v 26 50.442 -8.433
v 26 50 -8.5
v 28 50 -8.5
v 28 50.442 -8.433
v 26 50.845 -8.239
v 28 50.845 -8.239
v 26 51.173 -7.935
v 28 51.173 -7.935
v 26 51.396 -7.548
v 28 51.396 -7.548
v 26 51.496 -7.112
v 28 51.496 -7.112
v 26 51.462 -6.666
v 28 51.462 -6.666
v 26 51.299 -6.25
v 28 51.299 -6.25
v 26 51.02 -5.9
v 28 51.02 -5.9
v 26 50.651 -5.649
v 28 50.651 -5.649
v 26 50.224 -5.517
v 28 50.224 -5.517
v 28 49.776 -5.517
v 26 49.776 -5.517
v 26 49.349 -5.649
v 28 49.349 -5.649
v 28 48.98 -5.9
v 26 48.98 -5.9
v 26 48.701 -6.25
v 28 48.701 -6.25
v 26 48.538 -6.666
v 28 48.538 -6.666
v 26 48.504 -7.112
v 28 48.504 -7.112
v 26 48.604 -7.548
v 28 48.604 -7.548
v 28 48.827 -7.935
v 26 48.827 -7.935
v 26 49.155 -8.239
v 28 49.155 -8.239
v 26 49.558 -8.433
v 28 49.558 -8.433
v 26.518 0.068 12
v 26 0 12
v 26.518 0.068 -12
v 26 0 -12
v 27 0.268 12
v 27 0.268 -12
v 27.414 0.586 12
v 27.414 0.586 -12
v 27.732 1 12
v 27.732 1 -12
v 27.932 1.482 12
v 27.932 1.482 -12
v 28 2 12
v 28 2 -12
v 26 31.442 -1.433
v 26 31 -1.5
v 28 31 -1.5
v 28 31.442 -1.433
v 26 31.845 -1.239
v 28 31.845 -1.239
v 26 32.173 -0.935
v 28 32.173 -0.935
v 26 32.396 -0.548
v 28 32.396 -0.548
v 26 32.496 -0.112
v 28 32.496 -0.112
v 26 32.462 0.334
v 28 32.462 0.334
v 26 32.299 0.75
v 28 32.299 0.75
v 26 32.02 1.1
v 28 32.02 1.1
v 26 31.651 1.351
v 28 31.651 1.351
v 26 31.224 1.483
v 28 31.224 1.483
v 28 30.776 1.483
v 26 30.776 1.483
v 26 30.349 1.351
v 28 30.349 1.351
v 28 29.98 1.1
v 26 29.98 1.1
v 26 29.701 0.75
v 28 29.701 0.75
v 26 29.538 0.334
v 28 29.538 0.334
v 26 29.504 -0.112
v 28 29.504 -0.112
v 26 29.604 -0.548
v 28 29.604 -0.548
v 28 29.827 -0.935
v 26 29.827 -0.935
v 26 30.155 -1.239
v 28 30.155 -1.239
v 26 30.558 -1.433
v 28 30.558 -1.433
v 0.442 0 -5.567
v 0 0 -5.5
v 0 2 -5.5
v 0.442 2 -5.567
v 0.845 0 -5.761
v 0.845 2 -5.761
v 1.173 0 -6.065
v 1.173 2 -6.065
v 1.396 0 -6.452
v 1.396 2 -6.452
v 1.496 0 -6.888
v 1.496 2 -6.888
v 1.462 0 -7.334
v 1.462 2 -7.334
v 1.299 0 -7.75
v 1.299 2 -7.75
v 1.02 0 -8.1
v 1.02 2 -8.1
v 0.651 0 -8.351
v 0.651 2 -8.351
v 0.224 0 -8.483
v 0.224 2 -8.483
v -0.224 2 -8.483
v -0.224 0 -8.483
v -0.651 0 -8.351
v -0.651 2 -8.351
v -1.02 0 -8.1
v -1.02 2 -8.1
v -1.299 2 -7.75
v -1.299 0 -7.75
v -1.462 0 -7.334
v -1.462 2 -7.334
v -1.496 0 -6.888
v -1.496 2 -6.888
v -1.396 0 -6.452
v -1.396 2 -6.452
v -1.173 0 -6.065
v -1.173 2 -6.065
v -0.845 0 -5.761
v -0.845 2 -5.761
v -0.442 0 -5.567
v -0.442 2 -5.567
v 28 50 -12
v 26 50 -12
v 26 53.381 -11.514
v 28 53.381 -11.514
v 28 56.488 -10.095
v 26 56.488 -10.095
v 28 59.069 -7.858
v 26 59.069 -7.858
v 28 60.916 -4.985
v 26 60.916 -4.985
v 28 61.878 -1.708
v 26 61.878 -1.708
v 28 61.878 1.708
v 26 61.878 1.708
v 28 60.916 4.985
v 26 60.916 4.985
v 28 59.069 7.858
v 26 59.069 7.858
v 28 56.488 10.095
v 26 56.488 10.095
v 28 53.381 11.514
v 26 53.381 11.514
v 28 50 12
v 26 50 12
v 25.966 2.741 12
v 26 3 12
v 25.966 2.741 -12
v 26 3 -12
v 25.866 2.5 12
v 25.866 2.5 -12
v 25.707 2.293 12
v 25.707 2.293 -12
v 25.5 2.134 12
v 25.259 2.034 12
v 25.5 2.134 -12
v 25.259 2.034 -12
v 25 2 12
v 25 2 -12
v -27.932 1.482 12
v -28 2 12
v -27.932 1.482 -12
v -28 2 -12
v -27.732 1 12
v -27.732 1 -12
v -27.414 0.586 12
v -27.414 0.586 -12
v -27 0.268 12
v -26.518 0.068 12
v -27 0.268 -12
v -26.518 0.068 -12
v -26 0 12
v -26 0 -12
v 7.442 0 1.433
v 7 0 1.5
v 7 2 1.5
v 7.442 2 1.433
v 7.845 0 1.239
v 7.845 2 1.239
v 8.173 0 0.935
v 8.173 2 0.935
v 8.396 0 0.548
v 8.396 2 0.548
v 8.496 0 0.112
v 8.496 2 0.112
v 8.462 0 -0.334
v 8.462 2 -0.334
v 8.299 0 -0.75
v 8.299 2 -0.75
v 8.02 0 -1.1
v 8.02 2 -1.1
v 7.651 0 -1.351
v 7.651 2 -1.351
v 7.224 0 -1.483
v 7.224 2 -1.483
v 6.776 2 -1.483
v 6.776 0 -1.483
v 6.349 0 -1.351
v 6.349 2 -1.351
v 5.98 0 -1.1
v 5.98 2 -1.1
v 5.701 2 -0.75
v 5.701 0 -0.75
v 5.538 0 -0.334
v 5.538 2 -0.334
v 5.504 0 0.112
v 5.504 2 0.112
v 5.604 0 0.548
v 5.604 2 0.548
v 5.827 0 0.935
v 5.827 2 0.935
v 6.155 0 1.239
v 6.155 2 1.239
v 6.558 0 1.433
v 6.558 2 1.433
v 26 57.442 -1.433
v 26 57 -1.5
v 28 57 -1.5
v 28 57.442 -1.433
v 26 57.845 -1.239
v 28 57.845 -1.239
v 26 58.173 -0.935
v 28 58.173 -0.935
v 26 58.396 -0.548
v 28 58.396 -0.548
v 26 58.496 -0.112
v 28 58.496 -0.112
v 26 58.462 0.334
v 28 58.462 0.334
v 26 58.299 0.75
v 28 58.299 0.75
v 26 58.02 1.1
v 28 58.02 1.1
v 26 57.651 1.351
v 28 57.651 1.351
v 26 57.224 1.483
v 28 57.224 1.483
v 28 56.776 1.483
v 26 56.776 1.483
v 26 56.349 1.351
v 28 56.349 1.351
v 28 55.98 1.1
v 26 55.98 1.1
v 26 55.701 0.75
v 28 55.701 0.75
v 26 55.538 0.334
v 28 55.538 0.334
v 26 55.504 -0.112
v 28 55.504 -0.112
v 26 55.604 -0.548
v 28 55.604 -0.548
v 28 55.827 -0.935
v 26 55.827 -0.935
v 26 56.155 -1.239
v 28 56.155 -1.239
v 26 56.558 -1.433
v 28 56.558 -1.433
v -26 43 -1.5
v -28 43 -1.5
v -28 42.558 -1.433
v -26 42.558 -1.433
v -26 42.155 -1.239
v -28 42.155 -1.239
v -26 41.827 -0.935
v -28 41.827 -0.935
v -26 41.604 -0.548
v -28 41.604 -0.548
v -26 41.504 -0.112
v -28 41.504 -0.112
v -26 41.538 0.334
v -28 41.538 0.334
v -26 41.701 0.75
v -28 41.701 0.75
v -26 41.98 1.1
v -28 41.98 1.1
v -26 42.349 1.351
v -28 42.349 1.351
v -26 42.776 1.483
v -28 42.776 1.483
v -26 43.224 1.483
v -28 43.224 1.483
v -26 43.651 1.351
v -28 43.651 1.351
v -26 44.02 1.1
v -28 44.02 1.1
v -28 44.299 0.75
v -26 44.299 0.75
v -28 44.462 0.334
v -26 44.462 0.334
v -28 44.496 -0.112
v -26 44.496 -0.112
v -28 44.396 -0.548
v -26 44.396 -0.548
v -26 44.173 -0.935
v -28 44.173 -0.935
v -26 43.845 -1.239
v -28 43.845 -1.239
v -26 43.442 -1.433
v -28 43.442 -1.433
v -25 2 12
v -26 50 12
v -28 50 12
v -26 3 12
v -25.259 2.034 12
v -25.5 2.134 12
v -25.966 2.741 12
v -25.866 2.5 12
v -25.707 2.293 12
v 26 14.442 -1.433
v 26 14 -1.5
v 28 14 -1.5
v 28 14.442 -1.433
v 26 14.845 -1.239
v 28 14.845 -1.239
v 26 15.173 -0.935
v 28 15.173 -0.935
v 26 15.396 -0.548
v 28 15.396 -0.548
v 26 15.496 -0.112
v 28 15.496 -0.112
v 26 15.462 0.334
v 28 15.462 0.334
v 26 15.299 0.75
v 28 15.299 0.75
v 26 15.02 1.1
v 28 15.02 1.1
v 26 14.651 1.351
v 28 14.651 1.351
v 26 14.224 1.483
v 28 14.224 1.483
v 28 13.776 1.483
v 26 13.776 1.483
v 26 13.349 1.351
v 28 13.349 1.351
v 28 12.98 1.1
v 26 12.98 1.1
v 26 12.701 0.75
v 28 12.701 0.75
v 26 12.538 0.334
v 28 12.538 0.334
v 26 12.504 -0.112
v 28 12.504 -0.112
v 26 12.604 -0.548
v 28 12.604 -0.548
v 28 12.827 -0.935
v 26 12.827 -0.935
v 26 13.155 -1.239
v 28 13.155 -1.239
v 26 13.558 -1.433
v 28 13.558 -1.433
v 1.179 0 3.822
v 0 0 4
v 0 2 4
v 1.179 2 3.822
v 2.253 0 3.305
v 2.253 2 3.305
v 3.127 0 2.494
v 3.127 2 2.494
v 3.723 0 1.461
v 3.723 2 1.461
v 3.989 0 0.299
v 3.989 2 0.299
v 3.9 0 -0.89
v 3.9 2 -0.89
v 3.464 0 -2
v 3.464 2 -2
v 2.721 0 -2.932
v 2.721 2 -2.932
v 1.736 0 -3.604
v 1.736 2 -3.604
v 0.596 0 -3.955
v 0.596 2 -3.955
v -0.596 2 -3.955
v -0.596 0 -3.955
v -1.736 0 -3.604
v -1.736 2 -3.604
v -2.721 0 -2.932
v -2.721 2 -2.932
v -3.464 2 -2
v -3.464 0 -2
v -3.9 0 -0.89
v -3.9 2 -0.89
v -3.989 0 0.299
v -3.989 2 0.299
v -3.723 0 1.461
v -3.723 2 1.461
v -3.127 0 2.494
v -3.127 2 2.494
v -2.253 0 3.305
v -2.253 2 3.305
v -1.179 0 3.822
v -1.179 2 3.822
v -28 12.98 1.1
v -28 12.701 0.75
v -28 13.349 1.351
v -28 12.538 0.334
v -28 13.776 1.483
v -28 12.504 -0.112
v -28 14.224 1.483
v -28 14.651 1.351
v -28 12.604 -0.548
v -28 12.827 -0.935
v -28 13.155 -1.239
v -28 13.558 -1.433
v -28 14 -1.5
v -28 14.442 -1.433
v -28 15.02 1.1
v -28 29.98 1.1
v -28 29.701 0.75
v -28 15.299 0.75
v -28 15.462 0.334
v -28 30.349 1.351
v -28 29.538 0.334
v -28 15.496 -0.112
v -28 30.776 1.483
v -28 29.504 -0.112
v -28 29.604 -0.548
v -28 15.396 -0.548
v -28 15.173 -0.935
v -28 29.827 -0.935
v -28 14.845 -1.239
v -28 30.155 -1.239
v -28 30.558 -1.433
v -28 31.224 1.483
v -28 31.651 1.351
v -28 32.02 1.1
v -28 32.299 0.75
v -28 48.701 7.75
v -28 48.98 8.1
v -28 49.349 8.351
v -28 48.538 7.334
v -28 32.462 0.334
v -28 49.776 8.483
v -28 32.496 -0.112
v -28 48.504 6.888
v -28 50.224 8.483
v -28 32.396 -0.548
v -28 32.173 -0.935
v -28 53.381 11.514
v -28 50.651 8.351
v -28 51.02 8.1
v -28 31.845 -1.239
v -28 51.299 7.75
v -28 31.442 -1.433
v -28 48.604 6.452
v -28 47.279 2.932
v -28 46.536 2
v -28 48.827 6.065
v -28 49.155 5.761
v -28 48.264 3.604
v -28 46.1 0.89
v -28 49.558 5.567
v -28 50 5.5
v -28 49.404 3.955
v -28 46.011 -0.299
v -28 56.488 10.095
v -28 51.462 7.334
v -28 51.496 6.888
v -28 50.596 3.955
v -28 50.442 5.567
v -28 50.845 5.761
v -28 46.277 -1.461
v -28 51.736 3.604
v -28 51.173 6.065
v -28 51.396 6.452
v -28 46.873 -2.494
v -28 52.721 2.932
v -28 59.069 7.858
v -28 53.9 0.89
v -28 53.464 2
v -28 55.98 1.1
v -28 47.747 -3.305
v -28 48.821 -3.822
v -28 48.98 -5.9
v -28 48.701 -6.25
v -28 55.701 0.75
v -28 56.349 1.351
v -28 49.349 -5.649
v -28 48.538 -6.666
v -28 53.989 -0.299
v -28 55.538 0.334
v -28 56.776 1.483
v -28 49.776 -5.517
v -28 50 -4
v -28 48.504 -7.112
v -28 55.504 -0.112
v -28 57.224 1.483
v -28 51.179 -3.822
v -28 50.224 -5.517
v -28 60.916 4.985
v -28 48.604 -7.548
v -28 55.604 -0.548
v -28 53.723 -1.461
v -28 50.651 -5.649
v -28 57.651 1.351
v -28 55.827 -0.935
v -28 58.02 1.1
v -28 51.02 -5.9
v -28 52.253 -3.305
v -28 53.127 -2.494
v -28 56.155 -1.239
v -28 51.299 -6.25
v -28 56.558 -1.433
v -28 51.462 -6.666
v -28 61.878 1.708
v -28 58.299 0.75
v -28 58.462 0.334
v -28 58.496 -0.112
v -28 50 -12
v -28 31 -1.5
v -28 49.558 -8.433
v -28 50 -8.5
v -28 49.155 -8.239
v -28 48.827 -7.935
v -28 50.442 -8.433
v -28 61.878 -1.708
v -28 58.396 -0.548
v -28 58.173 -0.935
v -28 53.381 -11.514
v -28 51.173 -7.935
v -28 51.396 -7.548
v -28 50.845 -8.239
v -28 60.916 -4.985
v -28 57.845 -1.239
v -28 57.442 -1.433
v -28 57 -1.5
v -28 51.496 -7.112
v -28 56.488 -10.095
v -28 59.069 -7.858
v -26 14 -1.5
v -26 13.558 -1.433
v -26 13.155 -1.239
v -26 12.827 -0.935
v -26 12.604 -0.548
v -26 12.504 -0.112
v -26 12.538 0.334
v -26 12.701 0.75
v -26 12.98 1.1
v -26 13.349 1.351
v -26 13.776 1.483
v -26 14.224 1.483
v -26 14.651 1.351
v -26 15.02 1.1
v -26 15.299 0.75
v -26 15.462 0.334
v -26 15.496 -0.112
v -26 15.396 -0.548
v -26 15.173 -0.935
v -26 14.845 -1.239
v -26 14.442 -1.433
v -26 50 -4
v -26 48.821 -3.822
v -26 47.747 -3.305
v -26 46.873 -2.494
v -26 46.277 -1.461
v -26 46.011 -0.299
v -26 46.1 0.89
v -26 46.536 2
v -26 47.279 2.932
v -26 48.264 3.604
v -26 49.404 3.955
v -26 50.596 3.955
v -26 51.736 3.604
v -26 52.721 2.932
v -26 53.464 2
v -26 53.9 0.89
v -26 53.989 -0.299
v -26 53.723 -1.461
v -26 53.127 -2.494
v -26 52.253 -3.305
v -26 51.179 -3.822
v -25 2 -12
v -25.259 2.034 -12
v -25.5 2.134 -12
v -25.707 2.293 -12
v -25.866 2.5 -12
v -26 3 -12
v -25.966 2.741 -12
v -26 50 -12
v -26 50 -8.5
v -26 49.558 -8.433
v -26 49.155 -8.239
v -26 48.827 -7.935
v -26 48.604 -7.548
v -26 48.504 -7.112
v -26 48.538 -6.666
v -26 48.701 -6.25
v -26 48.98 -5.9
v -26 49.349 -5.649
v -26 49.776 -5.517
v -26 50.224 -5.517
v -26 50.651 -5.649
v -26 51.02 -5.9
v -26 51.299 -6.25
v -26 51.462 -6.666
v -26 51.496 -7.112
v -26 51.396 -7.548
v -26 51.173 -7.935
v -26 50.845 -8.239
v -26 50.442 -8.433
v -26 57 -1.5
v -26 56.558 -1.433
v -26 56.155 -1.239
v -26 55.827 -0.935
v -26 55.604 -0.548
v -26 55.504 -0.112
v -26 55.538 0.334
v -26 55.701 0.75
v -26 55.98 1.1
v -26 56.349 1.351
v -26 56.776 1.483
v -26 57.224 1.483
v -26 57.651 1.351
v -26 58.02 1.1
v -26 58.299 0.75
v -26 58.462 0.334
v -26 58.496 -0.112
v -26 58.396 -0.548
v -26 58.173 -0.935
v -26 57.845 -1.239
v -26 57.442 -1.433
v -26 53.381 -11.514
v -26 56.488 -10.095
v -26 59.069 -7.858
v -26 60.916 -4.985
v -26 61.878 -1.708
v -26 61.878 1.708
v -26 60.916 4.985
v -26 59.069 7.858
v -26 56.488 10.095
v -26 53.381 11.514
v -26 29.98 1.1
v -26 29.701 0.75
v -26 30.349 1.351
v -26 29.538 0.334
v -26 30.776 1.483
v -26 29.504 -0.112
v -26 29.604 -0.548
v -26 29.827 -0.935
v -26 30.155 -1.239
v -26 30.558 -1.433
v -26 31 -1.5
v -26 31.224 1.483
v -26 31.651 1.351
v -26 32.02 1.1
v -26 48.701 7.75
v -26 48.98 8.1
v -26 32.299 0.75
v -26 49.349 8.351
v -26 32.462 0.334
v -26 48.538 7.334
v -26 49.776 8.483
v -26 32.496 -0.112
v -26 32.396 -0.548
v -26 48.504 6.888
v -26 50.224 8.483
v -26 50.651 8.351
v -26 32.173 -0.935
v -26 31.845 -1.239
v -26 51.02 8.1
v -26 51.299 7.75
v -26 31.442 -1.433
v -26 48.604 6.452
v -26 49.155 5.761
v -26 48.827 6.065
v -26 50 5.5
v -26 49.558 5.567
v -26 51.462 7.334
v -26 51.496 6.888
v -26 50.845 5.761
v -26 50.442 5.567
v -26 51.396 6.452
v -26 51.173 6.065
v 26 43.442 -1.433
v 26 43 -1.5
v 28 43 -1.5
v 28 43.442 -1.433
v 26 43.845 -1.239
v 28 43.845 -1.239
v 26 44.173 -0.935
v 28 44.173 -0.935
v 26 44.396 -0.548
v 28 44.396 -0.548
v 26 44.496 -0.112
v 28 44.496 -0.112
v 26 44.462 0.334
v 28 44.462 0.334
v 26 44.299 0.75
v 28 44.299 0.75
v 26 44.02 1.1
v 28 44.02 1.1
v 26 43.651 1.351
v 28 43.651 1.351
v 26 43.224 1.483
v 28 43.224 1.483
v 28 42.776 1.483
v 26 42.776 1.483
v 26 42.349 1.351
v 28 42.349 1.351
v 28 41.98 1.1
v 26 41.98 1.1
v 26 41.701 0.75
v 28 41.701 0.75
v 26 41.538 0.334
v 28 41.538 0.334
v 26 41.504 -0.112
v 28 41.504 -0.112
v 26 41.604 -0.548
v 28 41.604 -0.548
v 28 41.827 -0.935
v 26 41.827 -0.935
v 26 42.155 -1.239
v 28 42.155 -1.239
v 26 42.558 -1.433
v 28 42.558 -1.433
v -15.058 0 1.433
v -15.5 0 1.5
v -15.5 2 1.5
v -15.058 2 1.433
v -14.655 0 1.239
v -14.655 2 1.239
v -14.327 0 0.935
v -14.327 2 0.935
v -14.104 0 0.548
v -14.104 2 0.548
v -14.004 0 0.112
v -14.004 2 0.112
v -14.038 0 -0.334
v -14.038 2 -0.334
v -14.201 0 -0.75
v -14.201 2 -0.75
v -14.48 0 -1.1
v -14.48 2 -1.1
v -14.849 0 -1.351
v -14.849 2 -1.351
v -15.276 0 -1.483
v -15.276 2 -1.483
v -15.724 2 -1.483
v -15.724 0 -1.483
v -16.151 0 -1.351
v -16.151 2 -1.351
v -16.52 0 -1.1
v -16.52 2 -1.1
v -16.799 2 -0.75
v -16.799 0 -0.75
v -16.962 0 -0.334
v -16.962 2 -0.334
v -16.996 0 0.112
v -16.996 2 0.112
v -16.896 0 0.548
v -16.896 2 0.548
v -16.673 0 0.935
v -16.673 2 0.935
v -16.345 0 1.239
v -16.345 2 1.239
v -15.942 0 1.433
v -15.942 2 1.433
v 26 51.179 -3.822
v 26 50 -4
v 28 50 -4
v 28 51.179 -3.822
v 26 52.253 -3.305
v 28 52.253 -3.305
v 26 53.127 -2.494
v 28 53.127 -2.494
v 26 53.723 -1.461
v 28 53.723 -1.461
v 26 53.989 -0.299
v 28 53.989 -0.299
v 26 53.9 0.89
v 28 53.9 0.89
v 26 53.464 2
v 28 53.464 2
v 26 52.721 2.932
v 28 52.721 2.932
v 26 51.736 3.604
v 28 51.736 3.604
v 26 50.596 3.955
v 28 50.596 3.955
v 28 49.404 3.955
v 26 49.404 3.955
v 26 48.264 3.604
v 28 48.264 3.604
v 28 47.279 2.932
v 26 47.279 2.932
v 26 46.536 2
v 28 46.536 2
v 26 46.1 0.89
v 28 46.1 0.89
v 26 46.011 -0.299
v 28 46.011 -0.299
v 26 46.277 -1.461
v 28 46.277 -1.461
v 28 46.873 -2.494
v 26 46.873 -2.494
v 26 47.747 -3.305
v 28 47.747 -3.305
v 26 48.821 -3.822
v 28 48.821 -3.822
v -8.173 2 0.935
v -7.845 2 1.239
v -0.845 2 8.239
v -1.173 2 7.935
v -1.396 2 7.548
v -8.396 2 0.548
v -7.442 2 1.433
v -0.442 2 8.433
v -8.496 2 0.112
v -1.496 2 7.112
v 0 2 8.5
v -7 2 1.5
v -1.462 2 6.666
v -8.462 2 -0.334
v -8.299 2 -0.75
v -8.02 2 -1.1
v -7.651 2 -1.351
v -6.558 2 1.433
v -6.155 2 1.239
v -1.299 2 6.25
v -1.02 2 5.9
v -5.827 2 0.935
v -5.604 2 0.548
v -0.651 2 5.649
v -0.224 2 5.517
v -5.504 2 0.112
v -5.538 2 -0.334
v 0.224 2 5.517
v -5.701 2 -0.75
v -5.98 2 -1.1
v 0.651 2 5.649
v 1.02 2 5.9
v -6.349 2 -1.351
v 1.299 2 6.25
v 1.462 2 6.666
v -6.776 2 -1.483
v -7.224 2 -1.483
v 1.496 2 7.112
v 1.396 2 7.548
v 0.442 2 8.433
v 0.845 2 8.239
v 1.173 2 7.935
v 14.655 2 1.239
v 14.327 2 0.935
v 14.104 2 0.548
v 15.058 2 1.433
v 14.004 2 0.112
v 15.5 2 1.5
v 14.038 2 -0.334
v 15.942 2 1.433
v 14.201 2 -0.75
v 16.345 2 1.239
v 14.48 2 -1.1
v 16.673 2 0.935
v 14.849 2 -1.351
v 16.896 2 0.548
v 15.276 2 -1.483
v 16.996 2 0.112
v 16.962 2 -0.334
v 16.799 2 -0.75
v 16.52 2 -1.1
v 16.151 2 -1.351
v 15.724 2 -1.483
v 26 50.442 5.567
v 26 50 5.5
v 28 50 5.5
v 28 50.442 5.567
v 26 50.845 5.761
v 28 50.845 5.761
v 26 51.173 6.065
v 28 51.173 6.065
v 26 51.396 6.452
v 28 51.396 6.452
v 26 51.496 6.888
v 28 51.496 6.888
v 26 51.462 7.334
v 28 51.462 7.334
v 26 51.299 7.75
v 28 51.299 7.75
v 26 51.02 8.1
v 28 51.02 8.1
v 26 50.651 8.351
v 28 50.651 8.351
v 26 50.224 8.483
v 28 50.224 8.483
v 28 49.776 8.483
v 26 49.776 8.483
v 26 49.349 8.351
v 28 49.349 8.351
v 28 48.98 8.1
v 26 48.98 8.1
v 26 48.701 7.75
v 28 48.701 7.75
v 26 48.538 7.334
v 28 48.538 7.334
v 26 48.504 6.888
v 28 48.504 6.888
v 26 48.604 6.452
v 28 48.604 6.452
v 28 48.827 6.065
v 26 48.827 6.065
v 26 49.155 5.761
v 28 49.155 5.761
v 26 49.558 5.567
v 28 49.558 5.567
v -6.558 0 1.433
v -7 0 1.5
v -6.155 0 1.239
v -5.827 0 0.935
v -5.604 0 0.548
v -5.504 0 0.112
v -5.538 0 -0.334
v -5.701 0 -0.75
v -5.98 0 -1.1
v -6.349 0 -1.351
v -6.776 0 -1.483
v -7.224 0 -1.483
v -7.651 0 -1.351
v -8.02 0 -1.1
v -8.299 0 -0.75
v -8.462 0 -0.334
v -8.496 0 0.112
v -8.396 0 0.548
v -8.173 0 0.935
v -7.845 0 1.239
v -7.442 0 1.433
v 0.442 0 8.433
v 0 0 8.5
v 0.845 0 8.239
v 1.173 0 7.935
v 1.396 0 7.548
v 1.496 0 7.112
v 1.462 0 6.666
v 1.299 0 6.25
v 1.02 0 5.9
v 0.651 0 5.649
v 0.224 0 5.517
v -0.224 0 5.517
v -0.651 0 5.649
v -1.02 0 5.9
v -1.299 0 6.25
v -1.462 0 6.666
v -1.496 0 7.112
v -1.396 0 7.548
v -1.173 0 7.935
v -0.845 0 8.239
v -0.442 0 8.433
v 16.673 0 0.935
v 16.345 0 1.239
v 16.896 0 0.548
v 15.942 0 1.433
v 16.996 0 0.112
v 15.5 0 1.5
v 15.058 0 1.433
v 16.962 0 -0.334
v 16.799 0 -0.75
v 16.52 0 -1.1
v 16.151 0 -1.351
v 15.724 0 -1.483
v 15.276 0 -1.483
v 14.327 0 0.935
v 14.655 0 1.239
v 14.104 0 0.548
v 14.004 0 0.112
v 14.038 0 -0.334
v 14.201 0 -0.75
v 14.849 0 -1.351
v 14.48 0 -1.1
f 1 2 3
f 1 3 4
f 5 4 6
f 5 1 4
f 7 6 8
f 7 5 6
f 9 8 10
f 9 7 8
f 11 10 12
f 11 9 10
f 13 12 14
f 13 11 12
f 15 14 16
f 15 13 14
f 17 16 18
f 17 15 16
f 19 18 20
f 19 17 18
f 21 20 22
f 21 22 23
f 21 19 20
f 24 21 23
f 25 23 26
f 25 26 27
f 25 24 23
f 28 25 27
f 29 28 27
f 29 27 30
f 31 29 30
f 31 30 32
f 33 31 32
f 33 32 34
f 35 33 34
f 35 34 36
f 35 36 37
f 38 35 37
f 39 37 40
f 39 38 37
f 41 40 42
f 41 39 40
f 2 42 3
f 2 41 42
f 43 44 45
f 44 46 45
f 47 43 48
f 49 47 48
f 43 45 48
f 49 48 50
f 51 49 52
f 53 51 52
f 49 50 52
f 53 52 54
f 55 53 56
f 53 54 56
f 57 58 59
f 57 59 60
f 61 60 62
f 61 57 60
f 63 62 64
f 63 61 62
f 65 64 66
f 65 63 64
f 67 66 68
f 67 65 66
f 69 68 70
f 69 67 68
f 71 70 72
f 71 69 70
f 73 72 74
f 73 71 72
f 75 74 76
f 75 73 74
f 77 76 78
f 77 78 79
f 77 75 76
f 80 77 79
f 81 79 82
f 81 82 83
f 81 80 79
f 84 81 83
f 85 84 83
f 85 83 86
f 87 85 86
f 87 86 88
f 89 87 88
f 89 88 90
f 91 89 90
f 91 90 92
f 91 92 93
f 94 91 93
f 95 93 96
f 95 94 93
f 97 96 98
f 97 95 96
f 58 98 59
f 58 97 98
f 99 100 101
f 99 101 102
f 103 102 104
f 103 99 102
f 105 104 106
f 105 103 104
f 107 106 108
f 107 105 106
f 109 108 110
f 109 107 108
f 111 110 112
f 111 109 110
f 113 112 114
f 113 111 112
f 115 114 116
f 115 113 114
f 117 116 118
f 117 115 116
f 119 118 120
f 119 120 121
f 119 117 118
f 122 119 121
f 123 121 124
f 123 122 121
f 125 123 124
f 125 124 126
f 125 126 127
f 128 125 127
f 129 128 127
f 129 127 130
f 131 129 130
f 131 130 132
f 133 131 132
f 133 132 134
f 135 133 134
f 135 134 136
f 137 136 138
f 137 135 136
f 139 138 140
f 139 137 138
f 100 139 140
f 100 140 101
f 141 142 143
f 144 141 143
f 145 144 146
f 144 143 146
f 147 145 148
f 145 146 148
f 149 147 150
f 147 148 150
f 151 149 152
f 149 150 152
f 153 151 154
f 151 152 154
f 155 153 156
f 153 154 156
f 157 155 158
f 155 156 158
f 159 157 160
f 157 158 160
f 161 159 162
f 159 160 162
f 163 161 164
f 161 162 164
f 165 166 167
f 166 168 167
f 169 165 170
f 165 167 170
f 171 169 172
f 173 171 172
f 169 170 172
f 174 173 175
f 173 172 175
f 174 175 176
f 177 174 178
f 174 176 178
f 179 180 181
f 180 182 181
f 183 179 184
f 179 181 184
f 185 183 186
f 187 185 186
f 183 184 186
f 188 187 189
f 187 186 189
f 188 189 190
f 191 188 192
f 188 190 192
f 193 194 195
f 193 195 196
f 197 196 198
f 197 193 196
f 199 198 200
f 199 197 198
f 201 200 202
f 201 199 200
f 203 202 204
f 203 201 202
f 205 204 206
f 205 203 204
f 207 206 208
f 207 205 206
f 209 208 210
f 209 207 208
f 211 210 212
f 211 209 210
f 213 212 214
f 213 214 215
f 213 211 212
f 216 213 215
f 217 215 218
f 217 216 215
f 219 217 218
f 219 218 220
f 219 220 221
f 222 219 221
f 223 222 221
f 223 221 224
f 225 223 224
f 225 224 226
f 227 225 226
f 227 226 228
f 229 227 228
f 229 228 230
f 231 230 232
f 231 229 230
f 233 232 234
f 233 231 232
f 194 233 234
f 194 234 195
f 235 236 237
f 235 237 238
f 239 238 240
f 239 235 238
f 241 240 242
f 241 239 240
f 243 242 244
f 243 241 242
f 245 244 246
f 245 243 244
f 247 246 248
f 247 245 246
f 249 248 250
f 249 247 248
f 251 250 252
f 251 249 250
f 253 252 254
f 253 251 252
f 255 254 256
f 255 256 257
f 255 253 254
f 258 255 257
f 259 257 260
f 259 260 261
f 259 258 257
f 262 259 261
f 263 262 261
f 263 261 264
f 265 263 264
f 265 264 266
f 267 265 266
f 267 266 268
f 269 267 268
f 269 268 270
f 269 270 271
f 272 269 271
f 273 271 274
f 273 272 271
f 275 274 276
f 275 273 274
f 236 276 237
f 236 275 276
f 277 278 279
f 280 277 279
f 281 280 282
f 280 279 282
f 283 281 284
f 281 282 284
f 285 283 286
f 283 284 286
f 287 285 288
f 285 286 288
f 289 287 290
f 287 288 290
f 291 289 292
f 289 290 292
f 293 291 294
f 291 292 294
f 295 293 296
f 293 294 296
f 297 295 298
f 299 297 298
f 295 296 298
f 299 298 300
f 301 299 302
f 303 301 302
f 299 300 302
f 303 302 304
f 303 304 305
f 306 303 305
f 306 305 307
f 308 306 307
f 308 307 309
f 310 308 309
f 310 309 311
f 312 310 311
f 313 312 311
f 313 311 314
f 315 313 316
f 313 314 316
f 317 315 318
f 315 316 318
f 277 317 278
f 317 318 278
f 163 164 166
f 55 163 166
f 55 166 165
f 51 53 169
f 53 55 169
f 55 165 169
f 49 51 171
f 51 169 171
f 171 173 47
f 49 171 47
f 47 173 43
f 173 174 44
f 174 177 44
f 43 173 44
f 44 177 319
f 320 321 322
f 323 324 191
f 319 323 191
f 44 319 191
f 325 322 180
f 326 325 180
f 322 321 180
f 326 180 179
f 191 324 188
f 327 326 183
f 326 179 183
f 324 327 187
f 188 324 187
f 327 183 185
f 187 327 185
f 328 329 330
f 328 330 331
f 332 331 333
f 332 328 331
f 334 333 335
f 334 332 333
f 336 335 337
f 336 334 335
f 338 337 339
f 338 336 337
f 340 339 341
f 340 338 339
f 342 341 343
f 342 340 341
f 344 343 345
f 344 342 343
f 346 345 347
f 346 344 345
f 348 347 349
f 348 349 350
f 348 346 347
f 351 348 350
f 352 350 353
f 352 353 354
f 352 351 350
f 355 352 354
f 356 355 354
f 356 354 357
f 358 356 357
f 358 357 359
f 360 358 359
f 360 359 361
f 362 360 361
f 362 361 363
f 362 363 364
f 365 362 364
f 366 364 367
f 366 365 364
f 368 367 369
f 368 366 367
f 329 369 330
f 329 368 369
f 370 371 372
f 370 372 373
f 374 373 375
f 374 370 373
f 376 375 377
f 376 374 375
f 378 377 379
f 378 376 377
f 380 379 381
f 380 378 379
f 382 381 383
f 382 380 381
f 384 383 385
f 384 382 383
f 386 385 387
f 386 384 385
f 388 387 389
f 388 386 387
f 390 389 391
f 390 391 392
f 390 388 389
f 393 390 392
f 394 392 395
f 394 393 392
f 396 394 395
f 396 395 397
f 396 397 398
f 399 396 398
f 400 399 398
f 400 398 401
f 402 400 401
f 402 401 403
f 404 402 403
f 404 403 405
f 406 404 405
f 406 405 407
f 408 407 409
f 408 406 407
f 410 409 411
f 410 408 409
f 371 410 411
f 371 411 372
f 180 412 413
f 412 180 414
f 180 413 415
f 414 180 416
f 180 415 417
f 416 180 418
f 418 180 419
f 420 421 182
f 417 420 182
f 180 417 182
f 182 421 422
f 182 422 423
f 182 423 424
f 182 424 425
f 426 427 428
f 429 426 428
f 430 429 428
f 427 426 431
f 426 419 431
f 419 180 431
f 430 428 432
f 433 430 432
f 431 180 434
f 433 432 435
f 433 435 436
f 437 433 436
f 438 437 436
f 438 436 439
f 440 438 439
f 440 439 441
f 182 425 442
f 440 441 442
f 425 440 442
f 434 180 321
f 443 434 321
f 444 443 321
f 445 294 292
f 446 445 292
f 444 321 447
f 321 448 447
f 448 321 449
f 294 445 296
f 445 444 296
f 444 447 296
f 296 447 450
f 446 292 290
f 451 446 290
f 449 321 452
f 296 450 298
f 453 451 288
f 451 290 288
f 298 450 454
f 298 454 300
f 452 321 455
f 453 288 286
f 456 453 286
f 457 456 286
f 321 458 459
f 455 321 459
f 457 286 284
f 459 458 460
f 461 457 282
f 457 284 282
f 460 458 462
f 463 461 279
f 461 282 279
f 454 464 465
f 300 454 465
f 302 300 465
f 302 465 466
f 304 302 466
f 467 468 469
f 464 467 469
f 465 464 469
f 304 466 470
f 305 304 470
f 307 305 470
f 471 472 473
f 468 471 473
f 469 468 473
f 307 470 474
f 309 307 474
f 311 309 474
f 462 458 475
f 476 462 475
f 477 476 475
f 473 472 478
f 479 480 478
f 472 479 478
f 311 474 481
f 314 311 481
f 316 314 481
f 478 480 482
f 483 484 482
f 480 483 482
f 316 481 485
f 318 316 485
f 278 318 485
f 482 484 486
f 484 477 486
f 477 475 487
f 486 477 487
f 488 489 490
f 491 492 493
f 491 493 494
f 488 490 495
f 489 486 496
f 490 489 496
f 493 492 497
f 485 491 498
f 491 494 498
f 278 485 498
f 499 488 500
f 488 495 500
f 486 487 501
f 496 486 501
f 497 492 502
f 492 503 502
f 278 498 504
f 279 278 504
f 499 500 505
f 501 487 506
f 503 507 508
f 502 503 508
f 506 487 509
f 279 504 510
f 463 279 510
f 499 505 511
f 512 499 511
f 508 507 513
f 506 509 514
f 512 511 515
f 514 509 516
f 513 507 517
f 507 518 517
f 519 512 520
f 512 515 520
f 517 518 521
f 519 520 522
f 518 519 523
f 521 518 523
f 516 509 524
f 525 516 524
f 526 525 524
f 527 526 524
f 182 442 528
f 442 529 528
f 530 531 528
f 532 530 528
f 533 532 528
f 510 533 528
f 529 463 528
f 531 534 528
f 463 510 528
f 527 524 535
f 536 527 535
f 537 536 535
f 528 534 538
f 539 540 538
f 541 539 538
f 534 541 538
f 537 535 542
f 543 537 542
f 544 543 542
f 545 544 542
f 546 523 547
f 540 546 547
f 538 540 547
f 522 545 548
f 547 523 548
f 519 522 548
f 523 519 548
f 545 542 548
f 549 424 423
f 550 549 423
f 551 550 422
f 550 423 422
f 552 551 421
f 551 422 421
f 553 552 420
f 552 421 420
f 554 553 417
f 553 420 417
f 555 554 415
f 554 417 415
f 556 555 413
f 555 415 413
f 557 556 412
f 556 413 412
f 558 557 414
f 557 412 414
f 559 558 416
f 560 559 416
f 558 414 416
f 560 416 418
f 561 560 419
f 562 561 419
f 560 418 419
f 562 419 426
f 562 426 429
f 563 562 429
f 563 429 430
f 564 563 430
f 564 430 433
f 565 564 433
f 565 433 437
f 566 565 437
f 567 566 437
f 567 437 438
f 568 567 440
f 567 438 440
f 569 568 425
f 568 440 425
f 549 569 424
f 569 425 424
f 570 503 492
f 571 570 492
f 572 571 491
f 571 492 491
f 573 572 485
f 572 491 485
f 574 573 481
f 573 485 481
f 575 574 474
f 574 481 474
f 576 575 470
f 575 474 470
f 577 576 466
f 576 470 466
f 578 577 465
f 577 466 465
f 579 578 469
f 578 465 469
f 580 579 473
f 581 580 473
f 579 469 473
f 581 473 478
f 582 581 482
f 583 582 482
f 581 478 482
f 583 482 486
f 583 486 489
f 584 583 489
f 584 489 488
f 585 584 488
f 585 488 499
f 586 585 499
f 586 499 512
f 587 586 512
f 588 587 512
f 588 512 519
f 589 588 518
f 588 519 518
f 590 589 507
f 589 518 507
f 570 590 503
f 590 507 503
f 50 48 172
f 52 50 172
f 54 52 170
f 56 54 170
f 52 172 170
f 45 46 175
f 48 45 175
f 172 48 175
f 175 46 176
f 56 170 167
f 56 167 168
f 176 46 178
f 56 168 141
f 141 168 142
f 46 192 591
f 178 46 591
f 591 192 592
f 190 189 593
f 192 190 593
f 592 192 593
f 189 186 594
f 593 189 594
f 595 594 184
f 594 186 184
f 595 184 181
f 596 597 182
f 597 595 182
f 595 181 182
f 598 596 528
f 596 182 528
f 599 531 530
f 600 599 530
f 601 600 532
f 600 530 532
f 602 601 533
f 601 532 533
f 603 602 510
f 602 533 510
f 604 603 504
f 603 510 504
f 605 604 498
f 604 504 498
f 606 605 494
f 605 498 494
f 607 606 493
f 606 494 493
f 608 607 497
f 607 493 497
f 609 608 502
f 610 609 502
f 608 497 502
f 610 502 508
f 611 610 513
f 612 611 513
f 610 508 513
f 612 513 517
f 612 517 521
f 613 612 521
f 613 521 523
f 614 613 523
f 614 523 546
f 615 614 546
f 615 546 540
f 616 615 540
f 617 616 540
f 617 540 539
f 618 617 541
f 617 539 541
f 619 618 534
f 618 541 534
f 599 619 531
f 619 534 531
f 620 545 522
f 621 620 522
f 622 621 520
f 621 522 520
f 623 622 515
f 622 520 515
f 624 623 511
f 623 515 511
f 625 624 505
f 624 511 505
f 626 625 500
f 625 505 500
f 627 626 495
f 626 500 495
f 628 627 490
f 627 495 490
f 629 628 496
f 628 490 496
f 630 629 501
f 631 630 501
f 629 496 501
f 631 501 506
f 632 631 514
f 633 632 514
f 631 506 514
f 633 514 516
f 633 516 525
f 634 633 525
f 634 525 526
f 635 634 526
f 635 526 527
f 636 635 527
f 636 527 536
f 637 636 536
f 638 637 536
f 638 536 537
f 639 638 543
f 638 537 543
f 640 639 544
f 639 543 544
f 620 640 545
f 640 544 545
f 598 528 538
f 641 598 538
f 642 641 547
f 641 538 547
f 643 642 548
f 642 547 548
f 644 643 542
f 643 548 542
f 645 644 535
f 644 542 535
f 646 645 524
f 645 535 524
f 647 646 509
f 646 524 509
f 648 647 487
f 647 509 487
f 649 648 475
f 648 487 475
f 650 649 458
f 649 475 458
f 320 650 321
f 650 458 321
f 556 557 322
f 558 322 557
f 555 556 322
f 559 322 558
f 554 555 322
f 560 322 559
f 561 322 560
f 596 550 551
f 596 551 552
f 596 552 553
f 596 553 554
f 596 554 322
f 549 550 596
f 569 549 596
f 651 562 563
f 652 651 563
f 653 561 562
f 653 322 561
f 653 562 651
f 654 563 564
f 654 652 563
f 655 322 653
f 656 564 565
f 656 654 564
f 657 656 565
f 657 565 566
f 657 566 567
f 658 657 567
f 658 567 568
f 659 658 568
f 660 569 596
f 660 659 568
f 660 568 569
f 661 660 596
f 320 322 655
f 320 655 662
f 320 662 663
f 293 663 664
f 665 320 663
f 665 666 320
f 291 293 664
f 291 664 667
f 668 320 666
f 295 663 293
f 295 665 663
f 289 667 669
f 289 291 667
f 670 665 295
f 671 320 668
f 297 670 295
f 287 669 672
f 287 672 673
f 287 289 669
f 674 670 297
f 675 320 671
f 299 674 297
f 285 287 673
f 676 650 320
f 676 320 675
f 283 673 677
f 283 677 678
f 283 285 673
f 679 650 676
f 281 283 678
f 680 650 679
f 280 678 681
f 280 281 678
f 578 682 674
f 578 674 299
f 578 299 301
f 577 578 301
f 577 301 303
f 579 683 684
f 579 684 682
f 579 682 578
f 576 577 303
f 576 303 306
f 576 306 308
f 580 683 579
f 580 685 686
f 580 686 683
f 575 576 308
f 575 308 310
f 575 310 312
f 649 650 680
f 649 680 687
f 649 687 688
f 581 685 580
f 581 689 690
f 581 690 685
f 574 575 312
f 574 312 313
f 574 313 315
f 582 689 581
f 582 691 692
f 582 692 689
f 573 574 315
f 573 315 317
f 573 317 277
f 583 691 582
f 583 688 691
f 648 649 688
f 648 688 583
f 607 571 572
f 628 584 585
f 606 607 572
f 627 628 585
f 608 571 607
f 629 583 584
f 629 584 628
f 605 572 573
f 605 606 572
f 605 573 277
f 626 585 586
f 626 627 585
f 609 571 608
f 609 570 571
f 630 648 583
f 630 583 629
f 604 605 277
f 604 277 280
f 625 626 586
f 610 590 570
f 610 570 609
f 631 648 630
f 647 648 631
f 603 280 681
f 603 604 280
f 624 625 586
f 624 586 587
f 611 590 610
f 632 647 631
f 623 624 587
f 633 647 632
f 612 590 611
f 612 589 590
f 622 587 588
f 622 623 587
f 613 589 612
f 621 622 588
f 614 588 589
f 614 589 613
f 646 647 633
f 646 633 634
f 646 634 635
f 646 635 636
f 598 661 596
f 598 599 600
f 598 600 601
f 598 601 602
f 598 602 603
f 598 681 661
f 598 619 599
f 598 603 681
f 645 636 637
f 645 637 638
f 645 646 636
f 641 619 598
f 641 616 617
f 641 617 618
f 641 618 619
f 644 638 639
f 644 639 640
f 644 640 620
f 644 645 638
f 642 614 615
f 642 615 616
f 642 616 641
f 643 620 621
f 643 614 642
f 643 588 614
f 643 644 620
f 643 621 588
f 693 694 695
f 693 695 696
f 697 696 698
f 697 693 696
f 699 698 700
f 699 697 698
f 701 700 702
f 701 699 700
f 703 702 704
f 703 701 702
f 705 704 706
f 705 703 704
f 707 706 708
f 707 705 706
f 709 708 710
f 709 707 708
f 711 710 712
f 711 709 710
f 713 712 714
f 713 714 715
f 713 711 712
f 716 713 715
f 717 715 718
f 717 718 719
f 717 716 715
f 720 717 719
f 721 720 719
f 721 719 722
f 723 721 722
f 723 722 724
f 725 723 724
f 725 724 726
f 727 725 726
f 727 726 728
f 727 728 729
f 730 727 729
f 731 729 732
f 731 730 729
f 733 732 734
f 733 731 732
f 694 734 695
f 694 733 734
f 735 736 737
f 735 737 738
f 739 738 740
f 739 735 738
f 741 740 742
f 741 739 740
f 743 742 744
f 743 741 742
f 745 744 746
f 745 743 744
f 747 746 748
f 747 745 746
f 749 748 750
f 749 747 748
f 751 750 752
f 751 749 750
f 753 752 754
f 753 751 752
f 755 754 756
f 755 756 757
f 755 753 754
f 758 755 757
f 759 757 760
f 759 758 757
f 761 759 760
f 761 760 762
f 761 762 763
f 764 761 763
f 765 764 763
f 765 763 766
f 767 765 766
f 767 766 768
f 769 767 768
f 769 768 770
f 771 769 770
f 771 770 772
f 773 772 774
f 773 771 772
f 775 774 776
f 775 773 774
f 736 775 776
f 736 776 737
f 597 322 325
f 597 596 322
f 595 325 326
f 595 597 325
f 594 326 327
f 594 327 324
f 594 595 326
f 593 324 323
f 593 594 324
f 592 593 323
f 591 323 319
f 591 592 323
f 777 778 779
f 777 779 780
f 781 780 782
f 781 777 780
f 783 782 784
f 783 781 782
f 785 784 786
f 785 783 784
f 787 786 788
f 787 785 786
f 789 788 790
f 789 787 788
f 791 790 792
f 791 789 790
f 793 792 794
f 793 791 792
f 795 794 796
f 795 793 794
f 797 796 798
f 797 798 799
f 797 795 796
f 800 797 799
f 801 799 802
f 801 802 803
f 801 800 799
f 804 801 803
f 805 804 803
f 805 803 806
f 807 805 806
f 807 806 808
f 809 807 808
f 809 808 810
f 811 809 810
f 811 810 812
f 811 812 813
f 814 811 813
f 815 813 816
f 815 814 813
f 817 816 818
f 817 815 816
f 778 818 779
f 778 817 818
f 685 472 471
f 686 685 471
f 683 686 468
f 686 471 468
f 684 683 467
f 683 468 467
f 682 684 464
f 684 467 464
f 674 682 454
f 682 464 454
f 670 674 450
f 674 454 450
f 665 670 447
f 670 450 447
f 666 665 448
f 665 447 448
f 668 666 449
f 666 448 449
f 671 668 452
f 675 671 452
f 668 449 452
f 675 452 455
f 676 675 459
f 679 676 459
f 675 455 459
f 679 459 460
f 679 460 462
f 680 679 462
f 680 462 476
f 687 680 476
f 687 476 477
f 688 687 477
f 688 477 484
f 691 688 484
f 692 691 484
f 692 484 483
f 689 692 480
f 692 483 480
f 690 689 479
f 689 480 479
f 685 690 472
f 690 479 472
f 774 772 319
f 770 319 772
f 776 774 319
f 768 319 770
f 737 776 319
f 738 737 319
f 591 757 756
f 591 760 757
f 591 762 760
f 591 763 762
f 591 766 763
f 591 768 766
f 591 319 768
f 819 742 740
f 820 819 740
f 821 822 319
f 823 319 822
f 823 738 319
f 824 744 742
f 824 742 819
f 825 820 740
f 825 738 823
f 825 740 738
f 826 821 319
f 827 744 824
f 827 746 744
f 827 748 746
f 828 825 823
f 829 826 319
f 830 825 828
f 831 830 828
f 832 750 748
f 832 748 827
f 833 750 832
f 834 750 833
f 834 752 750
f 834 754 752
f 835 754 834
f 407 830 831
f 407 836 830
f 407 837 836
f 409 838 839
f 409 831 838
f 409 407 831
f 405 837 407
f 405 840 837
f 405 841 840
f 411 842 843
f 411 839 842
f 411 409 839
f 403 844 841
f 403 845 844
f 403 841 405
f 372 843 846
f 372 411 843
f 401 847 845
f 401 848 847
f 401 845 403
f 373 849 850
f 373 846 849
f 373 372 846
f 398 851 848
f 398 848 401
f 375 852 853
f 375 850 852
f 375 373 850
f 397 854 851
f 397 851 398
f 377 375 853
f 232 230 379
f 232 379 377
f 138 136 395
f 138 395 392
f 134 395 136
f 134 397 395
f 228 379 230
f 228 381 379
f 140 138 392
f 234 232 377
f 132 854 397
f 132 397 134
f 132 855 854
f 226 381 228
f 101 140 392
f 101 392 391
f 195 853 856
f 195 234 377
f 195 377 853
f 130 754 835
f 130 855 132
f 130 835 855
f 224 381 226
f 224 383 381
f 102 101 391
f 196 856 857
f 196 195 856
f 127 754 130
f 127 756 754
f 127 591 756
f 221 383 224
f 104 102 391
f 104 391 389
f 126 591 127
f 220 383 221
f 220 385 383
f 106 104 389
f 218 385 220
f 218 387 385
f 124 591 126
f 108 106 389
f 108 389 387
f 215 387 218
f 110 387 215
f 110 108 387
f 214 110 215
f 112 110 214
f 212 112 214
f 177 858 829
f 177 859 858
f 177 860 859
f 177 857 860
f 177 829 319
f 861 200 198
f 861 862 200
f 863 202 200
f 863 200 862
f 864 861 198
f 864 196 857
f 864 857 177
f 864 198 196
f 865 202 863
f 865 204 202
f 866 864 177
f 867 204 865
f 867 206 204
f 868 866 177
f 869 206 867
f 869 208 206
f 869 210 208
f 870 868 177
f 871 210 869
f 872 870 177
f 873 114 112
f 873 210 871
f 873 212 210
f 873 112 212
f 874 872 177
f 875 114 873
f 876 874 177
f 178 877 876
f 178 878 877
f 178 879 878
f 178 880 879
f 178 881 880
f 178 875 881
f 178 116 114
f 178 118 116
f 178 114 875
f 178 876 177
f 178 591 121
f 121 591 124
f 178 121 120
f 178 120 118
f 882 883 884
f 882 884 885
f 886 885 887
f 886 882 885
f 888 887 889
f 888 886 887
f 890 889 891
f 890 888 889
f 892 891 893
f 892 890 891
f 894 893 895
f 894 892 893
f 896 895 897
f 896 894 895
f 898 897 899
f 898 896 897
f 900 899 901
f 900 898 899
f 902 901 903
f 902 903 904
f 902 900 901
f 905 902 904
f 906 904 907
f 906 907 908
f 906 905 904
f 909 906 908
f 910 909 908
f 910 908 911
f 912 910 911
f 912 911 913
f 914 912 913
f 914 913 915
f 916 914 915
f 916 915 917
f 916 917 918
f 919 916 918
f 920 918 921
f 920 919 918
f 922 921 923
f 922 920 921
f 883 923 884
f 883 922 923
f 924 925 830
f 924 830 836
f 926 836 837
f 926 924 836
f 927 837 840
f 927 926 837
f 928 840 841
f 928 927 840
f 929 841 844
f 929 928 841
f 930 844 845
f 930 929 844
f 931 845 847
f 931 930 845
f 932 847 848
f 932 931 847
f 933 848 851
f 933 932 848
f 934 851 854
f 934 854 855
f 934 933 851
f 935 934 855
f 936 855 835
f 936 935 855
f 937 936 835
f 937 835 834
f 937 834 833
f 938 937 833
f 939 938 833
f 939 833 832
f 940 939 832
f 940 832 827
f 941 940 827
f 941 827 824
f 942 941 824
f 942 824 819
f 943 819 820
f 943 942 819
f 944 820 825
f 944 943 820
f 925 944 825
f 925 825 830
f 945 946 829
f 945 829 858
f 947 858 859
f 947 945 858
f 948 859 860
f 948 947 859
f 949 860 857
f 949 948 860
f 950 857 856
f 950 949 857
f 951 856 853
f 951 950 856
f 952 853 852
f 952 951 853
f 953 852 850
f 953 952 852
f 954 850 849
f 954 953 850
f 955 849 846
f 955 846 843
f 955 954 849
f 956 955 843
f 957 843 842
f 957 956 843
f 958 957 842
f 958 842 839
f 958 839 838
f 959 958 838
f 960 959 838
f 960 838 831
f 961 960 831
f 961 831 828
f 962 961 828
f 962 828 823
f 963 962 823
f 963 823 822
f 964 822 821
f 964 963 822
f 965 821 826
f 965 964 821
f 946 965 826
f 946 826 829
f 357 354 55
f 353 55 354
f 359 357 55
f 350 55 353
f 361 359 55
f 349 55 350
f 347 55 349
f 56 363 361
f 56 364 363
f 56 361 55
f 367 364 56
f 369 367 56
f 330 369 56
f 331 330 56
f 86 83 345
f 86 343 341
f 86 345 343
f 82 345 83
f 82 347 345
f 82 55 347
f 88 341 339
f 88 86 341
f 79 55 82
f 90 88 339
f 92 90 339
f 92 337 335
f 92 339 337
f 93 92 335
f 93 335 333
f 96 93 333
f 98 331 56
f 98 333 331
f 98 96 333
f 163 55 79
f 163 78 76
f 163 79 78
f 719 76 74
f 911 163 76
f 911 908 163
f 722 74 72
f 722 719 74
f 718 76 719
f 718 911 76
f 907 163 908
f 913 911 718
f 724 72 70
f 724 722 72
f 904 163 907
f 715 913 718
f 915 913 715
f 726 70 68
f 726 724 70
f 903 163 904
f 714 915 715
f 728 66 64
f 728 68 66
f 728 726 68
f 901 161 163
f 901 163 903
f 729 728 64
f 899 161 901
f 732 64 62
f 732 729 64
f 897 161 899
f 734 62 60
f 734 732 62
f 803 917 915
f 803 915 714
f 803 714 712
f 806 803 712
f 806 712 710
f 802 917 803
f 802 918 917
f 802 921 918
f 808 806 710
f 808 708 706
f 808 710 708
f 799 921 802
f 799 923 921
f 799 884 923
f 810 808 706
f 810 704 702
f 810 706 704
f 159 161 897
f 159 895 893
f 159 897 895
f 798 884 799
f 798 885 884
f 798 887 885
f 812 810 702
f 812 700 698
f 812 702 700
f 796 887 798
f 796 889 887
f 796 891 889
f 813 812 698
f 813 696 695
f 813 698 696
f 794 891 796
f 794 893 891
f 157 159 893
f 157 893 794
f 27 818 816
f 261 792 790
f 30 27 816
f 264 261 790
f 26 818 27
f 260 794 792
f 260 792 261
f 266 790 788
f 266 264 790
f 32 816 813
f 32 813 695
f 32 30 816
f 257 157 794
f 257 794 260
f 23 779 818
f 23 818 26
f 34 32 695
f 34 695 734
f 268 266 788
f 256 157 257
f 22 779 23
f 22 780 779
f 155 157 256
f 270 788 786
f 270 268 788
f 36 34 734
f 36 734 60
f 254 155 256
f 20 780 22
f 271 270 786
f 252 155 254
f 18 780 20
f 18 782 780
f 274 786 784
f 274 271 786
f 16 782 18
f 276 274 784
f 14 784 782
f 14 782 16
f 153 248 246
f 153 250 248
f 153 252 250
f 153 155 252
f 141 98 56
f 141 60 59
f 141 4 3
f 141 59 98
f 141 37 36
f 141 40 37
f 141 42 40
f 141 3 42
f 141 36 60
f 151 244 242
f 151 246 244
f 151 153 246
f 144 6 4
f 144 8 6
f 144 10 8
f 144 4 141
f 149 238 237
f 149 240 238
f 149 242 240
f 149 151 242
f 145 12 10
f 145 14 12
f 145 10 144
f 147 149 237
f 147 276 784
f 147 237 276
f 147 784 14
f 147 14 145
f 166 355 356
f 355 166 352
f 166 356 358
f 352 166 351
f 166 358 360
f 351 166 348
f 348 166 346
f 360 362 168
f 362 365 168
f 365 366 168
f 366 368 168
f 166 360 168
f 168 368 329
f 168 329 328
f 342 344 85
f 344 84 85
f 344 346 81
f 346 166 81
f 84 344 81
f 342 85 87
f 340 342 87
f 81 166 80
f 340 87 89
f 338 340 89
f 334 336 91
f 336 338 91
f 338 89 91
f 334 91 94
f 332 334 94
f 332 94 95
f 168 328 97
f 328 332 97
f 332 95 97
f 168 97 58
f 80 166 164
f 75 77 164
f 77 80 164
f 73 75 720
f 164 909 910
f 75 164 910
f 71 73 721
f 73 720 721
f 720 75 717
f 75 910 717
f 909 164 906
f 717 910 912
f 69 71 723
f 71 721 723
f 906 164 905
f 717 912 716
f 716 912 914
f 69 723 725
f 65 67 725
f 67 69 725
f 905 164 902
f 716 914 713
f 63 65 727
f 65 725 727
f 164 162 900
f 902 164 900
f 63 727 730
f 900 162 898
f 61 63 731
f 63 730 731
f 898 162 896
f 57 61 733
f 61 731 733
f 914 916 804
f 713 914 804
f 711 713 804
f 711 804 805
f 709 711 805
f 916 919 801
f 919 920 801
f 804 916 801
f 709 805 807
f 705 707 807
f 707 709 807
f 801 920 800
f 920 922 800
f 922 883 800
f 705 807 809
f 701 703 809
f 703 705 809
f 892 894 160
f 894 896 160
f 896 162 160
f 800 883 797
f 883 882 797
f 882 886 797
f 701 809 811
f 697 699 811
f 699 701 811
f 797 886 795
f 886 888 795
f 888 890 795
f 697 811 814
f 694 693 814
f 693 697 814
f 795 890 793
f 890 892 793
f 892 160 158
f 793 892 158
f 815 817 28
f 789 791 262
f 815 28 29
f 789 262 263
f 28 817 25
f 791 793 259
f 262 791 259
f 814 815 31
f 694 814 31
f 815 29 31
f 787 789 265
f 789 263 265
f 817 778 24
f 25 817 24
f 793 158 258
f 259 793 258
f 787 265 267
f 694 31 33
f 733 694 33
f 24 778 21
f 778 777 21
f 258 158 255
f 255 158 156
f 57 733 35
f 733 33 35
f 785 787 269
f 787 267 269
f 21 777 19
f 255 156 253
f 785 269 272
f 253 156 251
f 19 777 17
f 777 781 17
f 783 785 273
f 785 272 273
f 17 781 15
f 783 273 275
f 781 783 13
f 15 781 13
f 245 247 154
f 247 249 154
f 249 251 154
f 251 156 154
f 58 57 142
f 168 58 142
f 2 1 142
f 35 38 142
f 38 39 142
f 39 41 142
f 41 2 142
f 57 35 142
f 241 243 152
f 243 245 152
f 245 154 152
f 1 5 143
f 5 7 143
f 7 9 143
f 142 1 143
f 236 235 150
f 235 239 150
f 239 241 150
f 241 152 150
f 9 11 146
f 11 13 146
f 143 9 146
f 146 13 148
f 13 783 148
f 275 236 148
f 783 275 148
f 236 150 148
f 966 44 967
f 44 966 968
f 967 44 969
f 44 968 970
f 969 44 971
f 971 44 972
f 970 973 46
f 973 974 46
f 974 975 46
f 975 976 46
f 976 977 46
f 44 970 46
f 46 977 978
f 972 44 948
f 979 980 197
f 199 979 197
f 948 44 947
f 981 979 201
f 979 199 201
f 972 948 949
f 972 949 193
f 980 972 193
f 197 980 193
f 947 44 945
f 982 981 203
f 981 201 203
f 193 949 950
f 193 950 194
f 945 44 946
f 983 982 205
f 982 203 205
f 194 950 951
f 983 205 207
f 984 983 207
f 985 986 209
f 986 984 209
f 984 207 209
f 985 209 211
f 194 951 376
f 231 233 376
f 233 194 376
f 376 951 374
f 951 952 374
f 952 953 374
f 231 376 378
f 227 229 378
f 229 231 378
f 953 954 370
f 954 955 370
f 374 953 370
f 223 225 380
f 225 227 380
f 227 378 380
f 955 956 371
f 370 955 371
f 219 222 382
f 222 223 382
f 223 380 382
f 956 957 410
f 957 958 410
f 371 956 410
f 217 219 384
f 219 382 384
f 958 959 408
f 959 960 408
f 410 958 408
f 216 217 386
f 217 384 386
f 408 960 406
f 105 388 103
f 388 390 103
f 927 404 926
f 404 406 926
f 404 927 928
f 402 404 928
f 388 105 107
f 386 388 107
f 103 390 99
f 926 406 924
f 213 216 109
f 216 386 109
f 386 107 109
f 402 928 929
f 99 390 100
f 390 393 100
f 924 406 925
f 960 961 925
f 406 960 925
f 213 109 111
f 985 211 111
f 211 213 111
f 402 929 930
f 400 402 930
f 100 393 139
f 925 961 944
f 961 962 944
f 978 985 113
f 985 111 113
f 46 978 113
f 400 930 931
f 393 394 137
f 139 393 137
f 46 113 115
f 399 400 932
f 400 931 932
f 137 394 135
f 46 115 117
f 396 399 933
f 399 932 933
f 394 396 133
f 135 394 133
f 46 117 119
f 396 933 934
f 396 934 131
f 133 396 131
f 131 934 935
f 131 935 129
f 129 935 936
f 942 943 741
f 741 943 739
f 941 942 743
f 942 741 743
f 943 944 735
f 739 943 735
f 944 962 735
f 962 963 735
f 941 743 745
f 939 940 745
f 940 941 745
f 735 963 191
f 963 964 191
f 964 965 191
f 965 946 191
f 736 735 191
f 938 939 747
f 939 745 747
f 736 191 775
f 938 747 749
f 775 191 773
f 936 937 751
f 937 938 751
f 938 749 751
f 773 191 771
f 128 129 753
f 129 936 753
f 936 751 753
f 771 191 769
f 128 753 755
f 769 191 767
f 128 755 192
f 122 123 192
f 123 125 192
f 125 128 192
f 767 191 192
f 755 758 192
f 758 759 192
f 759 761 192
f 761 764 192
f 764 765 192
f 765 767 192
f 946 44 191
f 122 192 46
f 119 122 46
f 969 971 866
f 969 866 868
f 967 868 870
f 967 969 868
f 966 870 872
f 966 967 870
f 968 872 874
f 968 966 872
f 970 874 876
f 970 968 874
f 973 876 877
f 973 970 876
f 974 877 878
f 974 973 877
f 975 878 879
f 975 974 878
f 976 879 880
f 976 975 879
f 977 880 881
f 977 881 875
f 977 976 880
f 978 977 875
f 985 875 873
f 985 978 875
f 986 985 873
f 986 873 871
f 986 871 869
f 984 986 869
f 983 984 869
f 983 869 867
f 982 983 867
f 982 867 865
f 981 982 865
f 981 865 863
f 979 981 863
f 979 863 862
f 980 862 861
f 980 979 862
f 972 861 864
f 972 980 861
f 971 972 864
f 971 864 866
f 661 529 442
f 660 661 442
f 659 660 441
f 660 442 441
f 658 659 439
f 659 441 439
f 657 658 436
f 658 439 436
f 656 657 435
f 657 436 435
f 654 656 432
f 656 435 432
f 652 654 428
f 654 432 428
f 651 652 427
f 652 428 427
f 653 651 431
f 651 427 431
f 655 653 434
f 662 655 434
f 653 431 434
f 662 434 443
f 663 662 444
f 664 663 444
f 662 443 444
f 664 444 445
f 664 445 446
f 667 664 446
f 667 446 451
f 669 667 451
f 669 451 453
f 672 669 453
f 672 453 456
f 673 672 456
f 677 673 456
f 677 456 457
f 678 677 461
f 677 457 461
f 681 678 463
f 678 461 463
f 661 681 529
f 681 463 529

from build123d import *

# Parameters (mm, degrees)
SKETCH1_W           = 52
SKETCH1_H           = 24
SKETCH1_R           = 4
SKETCH1_R_2         = 1.5
BOSS_EXTRUDE1_DEPTH = 2
SKETCH3_R           = 4
SKETCH3_R_2         = 1.5
BOSS_EXTRUDE2_DEPTH = 2
FILLET1_R           = 2
FILLET2_R           = 1
BOSS_EXTRUDE3_START = 2
SKETCH5_R           = 4
SKETCH5_R_2         = 1.5
BOSS_EXTRUDE3_DEPTH = 2
FILLET3_R           = 2
FILLET4_R           = 1


with BuildPart() as part:
    # Sketch1 → Boss-Extrude1 (new body)
    with BuildSketch(Plane(origin=(0, 0, 0), x_dir=(1, 0, 0), z_dir=(0, 1, 0))):
        Rectangle(SKETCH1_W, SKETCH1_H)
        with Locations(Location((0, 0, 0), (0, 0, 270))):
            Circle(SKETCH1_R, mode=Mode.SUBTRACT)
        with Locations(Location((0, 7, 0), (0, 0, 270))):
            Circle(SKETCH1_R_2, mode=Mode.SUBTRACT)
        with Locations(Location((0, -7, 0), (0, 0, 270))):
            Circle(SKETCH1_R_2, mode=Mode.SUBTRACT)
        with Locations(Location((7, 0, 0), (0, 0, 270))):
            Circle(SKETCH1_R_2, mode=Mode.SUBTRACT)
        with Locations(Location((-7, 0, 0), (0, 0, 270))):
            Circle(SKETCH1_R_2, mode=Mode.SUBTRACT)
        with Locations(Location((-15.5, 0, 0), (0, 0, 270))):
            Circle(SKETCH1_R_2, mode=Mode.SUBTRACT)
        with Locations(Location((15.5, 0, 0), (0, 0, 270))):
            Circle(SKETCH1_R_2, mode=Mode.SUBTRACT)
    extrude(amount=BOSS_EXTRUDE1_DEPTH)

    # Sketch3 → Boss-Extrude2 (add)
    with BuildSketch(Plane(origin=(26, 0, 0), x_dir=(0, 0, -1), z_dir=(1, 0, 0))):
        with BuildLine():
            Line((-12, 0), (12, 0))
            Line((12, 0), (12, 50))
            ThreePointArc((12, 50), (0, 62), (-12, 50))
            Line((-12, 50), (-12, 0))
        make_face()
        with Locations((0, 50)):
            Circle(SKETCH3_R, mode=Mode.SUBTRACT)
        with Locations((0, 57)):
            Circle(SKETCH3_R_2, mode=Mode.SUBTRACT)
        with Locations((7, 50)):
            Circle(SKETCH3_R_2, mode=Mode.SUBTRACT)
        with Locations((0, 43)):
            Circle(SKETCH3_R_2, mode=Mode.SUBTRACT)
        with Locations((-7, 50)):
            Circle(SKETCH3_R_2, mode=Mode.SUBTRACT)
        with Locations((0, 31)):
            Circle(SKETCH3_R_2, mode=Mode.SUBTRACT)
        with Locations((0, 14)):
            Circle(SKETCH3_R_2, mode=Mode.SUBTRACT)
    extrude(amount=BOSS_EXTRUDE2_DEPTH)

    # Fillet1
    fillet1_edges = [part.edges().sort_by_distance(p)[0] for p in [
        (28, 0, 0),
    ]]
    fillet(fillet1_edges, radius=FILLET1_R)

    # Fillet2
    fillet2_edges = [part.edges().sort_by_distance(p)[0] for p in [
        (26, 2, 0),
    ]]
    fillet(fillet2_edges, radius=FILLET2_R)

    # Sketch5 → Boss-Extrude3 (add)
    with BuildSketch(Plane.ZY.offset(26).offset(BOSS_EXTRUDE3_START)):
        with BuildLine():
            Line((-12, 0), (-12, 50))
            ThreePointArc((-12, 50), (0, 62), (12, 50))
            Line((12, 50), (12, 0))
            Line((12, 0), (-12, 0))
        make_face()
        with Locations(Location((0, 50, 0), (0, 0, 180))):
            Circle(SKETCH5_R, mode=Mode.SUBTRACT)
        with Locations(Location((0, 57, 0), (0, 0, 180))):
            Circle(SKETCH5_R_2, mode=Mode.SUBTRACT)
        with Locations(Location((0, 43, 0), (0, 0, 180))):
            Circle(SKETCH5_R_2, mode=Mode.SUBTRACT)
        with Locations(Location((7, 50, 0), (0, 0, 180))):
            Circle(SKETCH5_R_2, mode=Mode.SUBTRACT)
        with Locations(Location((-7, 50, 0), (0, 0, 180))):
            Circle(SKETCH5_R_2, mode=Mode.SUBTRACT)
        with Locations(Location((0, 31, 0), (0, 0, 180))):
            Circle(SKETCH5_R_2, mode=Mode.SUBTRACT)
        with Locations(Location((0, 14, 0), (0, 0, 180))):
            Circle(SKETCH5_R_2, mode=Mode.SUBTRACT)
    extrude(amount=-BOSS_EXTRUDE3_DEPTH)

    # Fillet3
    fillet3_edges = [part.edges().sort_by_distance(p)[0] for p in [
        (-28, 0, 0),
    ]]
    fillet(fillet3_edges, radius=FILLET3_R)

    # Fillet4
    fillet4_edges = [part.edges().sort_by_distance(p)[0] for p in [
        (-26, 2, 0),
    ]]
    fillet(fillet4_edges, radius=FILLET4_R)


solid = part.part
